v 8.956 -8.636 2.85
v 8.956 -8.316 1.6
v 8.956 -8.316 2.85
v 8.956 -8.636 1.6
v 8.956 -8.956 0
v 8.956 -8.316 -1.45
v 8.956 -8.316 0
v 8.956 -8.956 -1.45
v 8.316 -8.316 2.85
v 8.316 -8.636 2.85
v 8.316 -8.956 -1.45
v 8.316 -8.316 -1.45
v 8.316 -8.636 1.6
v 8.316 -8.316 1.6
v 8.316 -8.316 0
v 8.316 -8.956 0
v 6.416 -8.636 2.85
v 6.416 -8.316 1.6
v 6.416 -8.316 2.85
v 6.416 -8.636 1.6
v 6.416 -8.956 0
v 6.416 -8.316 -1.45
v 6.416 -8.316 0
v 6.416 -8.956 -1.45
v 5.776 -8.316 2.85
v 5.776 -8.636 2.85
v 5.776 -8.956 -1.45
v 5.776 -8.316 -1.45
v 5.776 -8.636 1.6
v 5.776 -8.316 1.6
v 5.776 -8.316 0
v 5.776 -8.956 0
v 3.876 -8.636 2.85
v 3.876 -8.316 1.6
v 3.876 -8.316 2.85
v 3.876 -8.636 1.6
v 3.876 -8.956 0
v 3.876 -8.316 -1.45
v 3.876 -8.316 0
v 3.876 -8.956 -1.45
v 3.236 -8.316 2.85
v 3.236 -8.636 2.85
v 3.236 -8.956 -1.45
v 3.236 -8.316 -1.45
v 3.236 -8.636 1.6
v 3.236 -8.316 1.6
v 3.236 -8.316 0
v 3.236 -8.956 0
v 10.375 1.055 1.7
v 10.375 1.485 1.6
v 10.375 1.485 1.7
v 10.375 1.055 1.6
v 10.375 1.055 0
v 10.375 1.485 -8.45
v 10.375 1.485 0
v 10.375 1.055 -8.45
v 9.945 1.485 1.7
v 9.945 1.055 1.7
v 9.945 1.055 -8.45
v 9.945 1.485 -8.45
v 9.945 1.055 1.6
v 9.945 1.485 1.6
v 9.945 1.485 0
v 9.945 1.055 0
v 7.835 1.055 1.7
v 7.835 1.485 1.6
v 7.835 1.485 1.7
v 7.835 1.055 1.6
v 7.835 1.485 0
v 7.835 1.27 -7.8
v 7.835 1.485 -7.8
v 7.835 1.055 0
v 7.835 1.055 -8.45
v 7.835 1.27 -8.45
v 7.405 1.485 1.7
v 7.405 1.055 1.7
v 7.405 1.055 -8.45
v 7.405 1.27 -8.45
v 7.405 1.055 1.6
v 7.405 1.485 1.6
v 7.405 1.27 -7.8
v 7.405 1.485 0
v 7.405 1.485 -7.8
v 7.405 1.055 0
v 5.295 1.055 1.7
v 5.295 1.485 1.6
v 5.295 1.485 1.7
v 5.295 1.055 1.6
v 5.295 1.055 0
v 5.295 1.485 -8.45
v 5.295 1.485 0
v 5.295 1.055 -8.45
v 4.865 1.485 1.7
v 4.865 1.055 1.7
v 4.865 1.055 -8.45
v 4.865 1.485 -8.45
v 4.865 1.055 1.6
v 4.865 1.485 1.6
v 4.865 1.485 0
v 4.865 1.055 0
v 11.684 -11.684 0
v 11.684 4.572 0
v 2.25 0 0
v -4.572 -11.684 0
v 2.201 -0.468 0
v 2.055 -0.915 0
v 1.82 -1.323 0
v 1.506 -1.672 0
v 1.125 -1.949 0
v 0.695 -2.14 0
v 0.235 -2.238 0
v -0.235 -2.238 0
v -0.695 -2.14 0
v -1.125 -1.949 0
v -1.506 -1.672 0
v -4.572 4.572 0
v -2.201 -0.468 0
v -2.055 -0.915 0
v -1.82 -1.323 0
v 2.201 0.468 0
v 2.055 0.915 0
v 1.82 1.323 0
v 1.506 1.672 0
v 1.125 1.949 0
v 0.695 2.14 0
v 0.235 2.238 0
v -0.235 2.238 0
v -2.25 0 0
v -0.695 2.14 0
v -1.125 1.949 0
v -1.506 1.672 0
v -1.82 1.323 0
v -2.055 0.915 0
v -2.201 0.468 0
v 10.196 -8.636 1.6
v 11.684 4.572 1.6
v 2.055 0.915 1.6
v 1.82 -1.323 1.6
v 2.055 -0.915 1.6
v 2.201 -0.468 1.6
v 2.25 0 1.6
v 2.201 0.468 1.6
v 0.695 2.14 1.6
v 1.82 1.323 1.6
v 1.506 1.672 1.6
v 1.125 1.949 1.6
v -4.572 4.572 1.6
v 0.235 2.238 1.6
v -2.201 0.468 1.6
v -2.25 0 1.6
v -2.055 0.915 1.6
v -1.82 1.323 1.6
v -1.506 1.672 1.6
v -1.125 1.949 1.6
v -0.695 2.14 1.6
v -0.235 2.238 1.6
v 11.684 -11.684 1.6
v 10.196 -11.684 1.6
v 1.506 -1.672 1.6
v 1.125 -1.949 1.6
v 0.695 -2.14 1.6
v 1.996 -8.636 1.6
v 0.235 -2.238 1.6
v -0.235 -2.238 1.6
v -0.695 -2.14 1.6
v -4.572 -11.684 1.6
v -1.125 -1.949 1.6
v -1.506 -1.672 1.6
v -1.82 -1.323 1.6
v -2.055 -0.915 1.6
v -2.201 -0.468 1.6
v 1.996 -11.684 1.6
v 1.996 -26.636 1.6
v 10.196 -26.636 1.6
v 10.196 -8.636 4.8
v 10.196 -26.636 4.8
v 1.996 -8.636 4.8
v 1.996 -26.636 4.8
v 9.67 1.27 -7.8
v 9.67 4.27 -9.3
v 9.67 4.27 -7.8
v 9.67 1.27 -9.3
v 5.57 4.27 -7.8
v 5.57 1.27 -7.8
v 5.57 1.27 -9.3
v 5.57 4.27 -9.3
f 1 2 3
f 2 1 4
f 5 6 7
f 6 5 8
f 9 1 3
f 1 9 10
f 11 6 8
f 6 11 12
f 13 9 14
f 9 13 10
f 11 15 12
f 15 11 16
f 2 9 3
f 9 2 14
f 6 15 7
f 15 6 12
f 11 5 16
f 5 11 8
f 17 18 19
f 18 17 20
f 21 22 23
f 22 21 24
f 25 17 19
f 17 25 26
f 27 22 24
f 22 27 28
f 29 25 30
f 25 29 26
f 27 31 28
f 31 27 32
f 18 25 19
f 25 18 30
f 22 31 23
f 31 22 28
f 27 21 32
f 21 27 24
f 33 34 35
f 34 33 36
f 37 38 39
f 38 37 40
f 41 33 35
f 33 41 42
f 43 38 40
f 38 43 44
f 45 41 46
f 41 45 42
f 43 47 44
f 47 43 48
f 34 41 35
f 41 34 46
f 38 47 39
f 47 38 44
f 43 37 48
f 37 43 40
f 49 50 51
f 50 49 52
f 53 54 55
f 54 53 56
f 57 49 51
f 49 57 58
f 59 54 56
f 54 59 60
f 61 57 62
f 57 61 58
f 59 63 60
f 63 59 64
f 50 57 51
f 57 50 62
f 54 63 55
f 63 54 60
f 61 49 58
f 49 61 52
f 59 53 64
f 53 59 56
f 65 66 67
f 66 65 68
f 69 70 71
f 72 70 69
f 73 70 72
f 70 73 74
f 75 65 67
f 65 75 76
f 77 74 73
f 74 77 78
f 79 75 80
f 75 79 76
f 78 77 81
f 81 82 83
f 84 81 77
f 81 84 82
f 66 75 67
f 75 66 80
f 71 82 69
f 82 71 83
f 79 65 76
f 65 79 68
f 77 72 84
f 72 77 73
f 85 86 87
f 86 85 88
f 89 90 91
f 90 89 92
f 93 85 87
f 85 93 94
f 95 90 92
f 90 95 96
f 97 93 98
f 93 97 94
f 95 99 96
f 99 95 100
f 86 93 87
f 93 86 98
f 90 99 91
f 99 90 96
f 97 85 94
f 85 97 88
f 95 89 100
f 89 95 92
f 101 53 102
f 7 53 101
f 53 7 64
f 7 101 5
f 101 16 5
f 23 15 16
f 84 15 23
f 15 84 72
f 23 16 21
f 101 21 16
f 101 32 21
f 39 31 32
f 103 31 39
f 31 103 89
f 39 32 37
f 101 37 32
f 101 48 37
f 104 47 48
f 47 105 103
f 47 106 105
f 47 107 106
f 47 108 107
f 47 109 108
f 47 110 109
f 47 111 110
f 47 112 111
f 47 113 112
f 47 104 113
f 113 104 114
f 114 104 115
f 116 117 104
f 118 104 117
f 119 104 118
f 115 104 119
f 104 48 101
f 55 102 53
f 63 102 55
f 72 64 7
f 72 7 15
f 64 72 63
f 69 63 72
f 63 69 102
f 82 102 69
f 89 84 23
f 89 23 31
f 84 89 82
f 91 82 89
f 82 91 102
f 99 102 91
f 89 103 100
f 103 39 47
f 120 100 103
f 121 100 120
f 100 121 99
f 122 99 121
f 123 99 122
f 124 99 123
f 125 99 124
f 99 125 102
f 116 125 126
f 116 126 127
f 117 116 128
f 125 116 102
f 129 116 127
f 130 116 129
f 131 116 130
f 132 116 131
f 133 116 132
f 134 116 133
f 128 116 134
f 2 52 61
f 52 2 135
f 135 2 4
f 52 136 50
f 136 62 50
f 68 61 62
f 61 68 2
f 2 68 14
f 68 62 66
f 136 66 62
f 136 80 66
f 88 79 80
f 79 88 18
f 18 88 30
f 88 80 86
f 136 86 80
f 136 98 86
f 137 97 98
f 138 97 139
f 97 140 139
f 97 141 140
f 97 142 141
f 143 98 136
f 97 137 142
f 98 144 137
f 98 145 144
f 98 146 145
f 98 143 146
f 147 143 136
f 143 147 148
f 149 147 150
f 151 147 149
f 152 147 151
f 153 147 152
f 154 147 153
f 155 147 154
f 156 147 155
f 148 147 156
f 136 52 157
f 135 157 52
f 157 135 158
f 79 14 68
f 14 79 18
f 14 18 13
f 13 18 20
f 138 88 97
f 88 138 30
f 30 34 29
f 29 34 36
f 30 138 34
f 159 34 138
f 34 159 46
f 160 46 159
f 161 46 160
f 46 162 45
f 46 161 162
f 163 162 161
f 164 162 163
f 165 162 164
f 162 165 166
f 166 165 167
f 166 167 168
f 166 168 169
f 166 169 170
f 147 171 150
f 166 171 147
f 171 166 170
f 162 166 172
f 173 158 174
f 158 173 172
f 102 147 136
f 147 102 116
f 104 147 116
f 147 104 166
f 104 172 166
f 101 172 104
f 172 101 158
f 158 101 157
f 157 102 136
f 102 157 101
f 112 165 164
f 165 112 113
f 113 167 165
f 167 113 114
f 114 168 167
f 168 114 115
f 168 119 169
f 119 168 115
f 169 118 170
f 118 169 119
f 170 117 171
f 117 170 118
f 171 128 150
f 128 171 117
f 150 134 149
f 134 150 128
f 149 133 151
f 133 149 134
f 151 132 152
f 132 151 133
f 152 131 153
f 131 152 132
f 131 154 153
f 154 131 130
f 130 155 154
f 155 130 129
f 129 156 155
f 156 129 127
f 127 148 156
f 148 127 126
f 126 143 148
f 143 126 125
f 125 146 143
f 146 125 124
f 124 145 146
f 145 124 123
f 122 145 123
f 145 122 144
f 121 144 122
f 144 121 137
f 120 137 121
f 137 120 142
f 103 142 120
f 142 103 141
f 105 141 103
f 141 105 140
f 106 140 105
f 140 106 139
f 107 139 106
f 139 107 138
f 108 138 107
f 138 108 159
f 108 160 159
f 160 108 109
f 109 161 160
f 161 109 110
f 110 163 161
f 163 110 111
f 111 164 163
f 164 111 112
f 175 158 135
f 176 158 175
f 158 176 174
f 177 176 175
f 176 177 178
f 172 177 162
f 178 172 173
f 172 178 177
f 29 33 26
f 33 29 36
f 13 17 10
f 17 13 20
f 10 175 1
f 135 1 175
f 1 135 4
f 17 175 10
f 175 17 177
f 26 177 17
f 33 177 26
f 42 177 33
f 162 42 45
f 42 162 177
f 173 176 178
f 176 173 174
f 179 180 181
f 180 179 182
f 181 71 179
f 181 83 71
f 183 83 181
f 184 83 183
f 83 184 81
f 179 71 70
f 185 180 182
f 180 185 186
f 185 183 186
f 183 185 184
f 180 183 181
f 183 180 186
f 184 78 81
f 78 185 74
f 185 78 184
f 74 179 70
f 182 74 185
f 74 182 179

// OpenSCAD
// file: sensor_pcb_dimensions.scad
/*
   Copyright 2018 Scott Bezek and the splitflap contributors

   Licensed under the Apache License, Version 2.0 (the "License");
   you may not use this file except in compliance with the License.
   You may obtain a copy of the License at

       http://www.apache.org/licenses/LICENSE-2.0

   Unless required by applicable law or agreed to in writing, software
   distributed under the License is distributed on an "AS IS" BASIS,
   WITHOUT WARRANTIES OR CONDITIONS OF ANY KIND, either express or implied.
   See the License for the specific language governing permissions and
   limitations under the License.
*/

include <m4_dimensions.scad>;

pcb_thickness = 1.6;
sensor_spool_distance = 0.70;  // distance from the sensor to the face of the spool

// From datasheet:
hall_effect_height = (2.8 + 3.2) / 2;
hall_effect_width = (3.9 + 4.3) / 2;
hall_effect_thickness = (1.40 + 1.60) / 2;
hall_effect_sensor_offset_y = hall_effect_height - 1.25;
hall_effect_pin_length_max = 14.5;

// From sensor.kicad_pcb:
pcb_height = 16.256;
pcb_length = 16.256;
pcb_hole_to_sensor_pin_1_x = 10.16;
pcb_hole_to_sensor_pin_1_y = 1.27;
sensor_pin_pitch = 2.54;
pcb_hole_to_connector_pin_1_x = 8.636;
pcb_hole_to_connector_pin_1_y = 8.636;
connector_pin_pitch = 2.54;
pcb_edge_to_hole_x = 4.572;
pcb_edge_to_hole_y = 4.572;

pcb_adjustment_range = 4;
pcb_hole_radius = m4_hole_diameter/2;

// Jig dimensions
pcb_jig_corner_fillet = 2;
pcb_jig_align_thickness = 2;
pcb_jig_align_length = 0;  // past the PCB thickness
pcb_jig_align_clearance = 0.25;  // on x, around the PCB
pcb_jig_depth_clearance = 0.1;  // on y, from sensor to jig


// Computed dimensions
pcb_hole_to_sensor_x = pcb_hole_to_sensor_pin_1_x - sensor_pin_pitch;
pcb_hole_to_sensor_y = pcb_hole_to_sensor_pin_1_y + hall_effect_sensor_offset_y;


// Rough numbers for 3d rendering only (non-critical dimensions)
pcb_connector_height = 3.2;
pcb_connector_width = 8.2;
pcb_connector_length = 18;
pcb_connector_pin_width = 0.64;
pcb_connector_pin_slop = 0.4;
pcb_connector_pin_tail_length = 3.05 + 2.5/2;

pcb_sensor_pin_width = 0.43;
// file: m4_dimensions.scad
/*
   Copyright 2015-2018 Scott Bezek and the splitflap contributors

   Licensed under the Apache License, Version 2.0 (the "License");
   you may not use this file except in compliance with the License.
   You may obtain a copy of the License at

       http://www.apache.org/licenses/LICENSE-2.0

   Unless required by applicable law or agreed to in writing, software
   distributed under the License is distributed on an "AS IS" BASIS,
   WITHOUT WARRANTIES OR CONDITIONS OF ANY KIND, either express or implied.
   See the License for the specific language governing permissions and
   limitations under the License.
*/

// M4 bolts
m4_hole_diameter = 4.5;
m4_bolt_length = 10;
m4_button_head_diameter = 7.6 + .2;
m4_button_head_length = 2.2 + .2;
m4_nut_width_flats = 7 + .2;
m4_nut_width_corners = 7/cos(180/6);
m4_nut_width_corners_padded = m4_nut_width_corners + .2;
m4_nut_length = 3.2;
m4_nut_length_padded = m4_nut_length + .2;
// main file
/*
   Copyright 2015-2018 Scott Bezek and the splitflap contributors

   Licensed under the Apache License, Version 2.0 (the "License");
   you may not use this file except in compliance with the License.
   You may obtain a copy of the License at

       http://www.apache.org/licenses/LICENSE-2.0

   Unless required by applicable law or agreed to in writing, software
   distributed under the License is distributed on an "AS IS" BASIS,
   WITHOUT WARRANTIES OR CONDITIONS OF ANY KIND, either express or implied.
   See the License for the specific language governing permissions and
   limitations under the License.
*/
include <m4_dimensions.scad>;
include <sensor_pcb_dimensions.scad>;


module pcb_outline_2d(hole=true) {
    difference() {
        translate([-pcb_edge_to_hole_x, -pcb_height + pcb_edge_to_hole_y]) {
            square([pcb_length, pcb_height]);
        }
        if(hole) {
            circle(r=m4_hole_diameter/2, $fn=30);
        }
    }
}

// 3D PCB module, origin at the center of the mounting hole on the bottom surface of the PCB
module pcb(pcb_to_spool, render_jig=false, jig_thickness=0) {
    color([0, 0.5, 0]) {
        linear_extrude(height=pcb_thickness) {
            pcb_outline_2d();
        }
    }

    // Connector
    color([0, 0, 0]) {
        translate([pcb_hole_to_connector_pin_1_x - connector_pin_pitch - pcb_connector_width/2, -pcb_hole_to_connector_pin_1_y - pcb_connector_length, pcb_thickness]) {
            cube([pcb_connector_width, pcb_connector_length, pcb_connector_height]);
        }
    }

    // Connector pins
    color([0.5, 0.5, 0.5]) {
        translate([pcb_hole_to_connector_pin_1_x - pcb_connector_pin_width/2, -pcb_hole_to_connector_pin_1_y - pcb_connector_pin_width/2, -pcb_connector_pin_tail_length + pcb_thickness + 2.5/2]) {
            cube([pcb_connector_pin_width, pcb_connector_pin_width, pcb_connector_pin_tail_length]);
            translate([-connector_pin_pitch, 0, 0]) {
                cube([pcb_connector_pin_width, pcb_connector_pin_width, pcb_connector_pin_tail_length]);
            }
            translate([-connector_pin_pitch * 2, 0, 0]) {
                cube([pcb_connector_pin_width, pcb_connector_pin_width, pcb_connector_pin_tail_length]);
            }
        }
    }

    // Sensor pins
    color([0.5, 0.5, 0.5]) {
        pin_extra_length = 0.1;  // pins excess sticking out from the back of the PCB
        sensor_z_offset = pcb_to_spool - sensor_spool_distance - hall_effect_thickness/2 - 0.1;
        sensor_pin_length = sensor_z_offset + pcb_thickness + pin_extra_length;
        assert(sensor_pin_length < hall_effect_pin_length_max, "Warning: design is too thick to fit sensor");

        translate([pcb_hole_to_sensor_pin_1_x - pcb_sensor_pin_width/2, pcb_hole_to_sensor_pin_1_y - pcb_sensor_pin_width/2, -sensor_z_offset]) {
            cube([pcb_sensor_pin_width, pcb_sensor_pin_width, sensor_pin_length]);
            translate([-sensor_pin_pitch, 0, 0]) {
                cube([pcb_sensor_pin_width, pcb_sensor_pin_width, sensor_pin_length]);
            }
            translate([-sensor_pin_pitch * 2, 0, 0]) {
                cube([pcb_sensor_pin_width, pcb_sensor_pin_width, sensor_pin_length]);
            }
        }
    }

    // Sensor body
    color([0, 0, 0]) {
        translate([pcb_hole_to_sensor_pin_1_x - sensor_pin_pitch - hall_effect_width/2, pcb_hole_to_sensor_pin_1_y, -pcb_to_spool + sensor_spool_distance]) {
            cube([hall_effect_width, hall_effect_height, hall_effect_thickness]);
        }
    }

    // Jig
    if(render_jig) {
        color([1, 1, 0])
        translate([-pcb_edge_to_hole_x - pcb_jig_align_thickness - pcb_jig_align_clearance, pcb_hole_to_sensor_pin_1_y + pcb_sensor_pin_width/2 + thickness, -pcb_to_sensor(pcb_to_spool) + pcb_jig_depth_clearance])
        rotate([90, 0, 0])
            sensor_jig(pcb_to_spool, jig_thickness);
    }
}

// 2D cutouts needed to mount the PCB module, origin at the center of the mounting hole
module pcb_cutouts(adjustment_range=pcb_adjustment_range) {
    hull_slide(delta=adjustment_range) {
        // Bolt slot
        hull() {
            circle(r=m4_hole_diameter/2, $fn=30);
            translate([pcb_hole_to_sensor_pin_1_x + sensor_pin_pitch - m4_hole_diameter/2, 0, 0])
                circle(r=m4_hole_diameter/2, $fn=30);
        }
        // Pin header slot
        translate([pcb_hole_to_connector_pin_1_x - connector_pin_pitch, -pcb_hole_to_connector_pin_1_y]) {
            hull() {
                pin_slot_height = pcb_connector_pin_width + pcb_connector_pin_slop;
                pin_slot_width = connector_pin_pitch * 4 - pin_slot_height;
                translate([pin_slot_width/2, 0, 0])
                    circle(pin_slot_height/2, $fn=15);
                translate([-pin_slot_width/2, 0, 0])
                    circle(pin_slot_height/2, $fn=15);
            }
        }
    }
}

module hull_slide(delta) {
    for (i = [0:$children - 1]) {
        hull() {
            translate([-delta, 0]) {
                children(i);
            }
            translate([delta, 0]) {
                children(i);
            }
        }
    }
}

function pcb_to_sensor(pcb_to_spool) = pcb_to_spool - sensor_spool_distance - hall_effect_thickness;  // using sensor rear face
function pcb_hole_to_sensor_x() = pcb_hole_to_sensor_x;
function pcb_hole_to_sensor_y() = pcb_hole_to_sensor_y;
function pcb_thickness() = pcb_thickness;
function sensor_jig_height(pcb_to_spool) = pcb_to_sensor(pcb_to_spool) - pcb_jig_depth_clearance + pcb_jig_align_length + pcb_thickness;
function sensor_jig_width(pcb_to_spool) = pcb_length + (pcb_jig_align_thickness + pcb_jig_align_clearance) * 2;

module sensor_jig(pcb_to_spool, thickness) {
    module fillet() {
        eps = 0.01;
        difference() {
            translate([-eps, -eps, 0])
                square(pcb_jig_corner_fillet + eps);
            translate([pcb_jig_corner_fillet, pcb_jig_corner_fillet, 0])
                circle(r=pcb_jig_corner_fillet, $fn=20);
        }
    }

    linear_extrude(thickness) {
        difference() {
        union() {
            square([sensor_jig_width(pcb_to_spool), pcb_to_sensor(pcb_to_spool) - pcb_jig_depth_clearance]);  // main body
            square([pcb_jig_align_thickness, sensor_jig_height(pcb_to_spool)]);  // alignment edge, left
            translate([sensor_jig_width(pcb_to_spool) - pcb_jig_align_thickness, 0])
            square([pcb_jig_align_thickness, sensor_jig_height(pcb_to_spool)]);  // alignment edge, right
        }
        fillet();
        mirror([1, 0, 0])
            translate([-sensor_jig_width(pcb_to_spool), 0, 0])
                fillet();
        }
    }
}

// Example usage:
pcb(10);
